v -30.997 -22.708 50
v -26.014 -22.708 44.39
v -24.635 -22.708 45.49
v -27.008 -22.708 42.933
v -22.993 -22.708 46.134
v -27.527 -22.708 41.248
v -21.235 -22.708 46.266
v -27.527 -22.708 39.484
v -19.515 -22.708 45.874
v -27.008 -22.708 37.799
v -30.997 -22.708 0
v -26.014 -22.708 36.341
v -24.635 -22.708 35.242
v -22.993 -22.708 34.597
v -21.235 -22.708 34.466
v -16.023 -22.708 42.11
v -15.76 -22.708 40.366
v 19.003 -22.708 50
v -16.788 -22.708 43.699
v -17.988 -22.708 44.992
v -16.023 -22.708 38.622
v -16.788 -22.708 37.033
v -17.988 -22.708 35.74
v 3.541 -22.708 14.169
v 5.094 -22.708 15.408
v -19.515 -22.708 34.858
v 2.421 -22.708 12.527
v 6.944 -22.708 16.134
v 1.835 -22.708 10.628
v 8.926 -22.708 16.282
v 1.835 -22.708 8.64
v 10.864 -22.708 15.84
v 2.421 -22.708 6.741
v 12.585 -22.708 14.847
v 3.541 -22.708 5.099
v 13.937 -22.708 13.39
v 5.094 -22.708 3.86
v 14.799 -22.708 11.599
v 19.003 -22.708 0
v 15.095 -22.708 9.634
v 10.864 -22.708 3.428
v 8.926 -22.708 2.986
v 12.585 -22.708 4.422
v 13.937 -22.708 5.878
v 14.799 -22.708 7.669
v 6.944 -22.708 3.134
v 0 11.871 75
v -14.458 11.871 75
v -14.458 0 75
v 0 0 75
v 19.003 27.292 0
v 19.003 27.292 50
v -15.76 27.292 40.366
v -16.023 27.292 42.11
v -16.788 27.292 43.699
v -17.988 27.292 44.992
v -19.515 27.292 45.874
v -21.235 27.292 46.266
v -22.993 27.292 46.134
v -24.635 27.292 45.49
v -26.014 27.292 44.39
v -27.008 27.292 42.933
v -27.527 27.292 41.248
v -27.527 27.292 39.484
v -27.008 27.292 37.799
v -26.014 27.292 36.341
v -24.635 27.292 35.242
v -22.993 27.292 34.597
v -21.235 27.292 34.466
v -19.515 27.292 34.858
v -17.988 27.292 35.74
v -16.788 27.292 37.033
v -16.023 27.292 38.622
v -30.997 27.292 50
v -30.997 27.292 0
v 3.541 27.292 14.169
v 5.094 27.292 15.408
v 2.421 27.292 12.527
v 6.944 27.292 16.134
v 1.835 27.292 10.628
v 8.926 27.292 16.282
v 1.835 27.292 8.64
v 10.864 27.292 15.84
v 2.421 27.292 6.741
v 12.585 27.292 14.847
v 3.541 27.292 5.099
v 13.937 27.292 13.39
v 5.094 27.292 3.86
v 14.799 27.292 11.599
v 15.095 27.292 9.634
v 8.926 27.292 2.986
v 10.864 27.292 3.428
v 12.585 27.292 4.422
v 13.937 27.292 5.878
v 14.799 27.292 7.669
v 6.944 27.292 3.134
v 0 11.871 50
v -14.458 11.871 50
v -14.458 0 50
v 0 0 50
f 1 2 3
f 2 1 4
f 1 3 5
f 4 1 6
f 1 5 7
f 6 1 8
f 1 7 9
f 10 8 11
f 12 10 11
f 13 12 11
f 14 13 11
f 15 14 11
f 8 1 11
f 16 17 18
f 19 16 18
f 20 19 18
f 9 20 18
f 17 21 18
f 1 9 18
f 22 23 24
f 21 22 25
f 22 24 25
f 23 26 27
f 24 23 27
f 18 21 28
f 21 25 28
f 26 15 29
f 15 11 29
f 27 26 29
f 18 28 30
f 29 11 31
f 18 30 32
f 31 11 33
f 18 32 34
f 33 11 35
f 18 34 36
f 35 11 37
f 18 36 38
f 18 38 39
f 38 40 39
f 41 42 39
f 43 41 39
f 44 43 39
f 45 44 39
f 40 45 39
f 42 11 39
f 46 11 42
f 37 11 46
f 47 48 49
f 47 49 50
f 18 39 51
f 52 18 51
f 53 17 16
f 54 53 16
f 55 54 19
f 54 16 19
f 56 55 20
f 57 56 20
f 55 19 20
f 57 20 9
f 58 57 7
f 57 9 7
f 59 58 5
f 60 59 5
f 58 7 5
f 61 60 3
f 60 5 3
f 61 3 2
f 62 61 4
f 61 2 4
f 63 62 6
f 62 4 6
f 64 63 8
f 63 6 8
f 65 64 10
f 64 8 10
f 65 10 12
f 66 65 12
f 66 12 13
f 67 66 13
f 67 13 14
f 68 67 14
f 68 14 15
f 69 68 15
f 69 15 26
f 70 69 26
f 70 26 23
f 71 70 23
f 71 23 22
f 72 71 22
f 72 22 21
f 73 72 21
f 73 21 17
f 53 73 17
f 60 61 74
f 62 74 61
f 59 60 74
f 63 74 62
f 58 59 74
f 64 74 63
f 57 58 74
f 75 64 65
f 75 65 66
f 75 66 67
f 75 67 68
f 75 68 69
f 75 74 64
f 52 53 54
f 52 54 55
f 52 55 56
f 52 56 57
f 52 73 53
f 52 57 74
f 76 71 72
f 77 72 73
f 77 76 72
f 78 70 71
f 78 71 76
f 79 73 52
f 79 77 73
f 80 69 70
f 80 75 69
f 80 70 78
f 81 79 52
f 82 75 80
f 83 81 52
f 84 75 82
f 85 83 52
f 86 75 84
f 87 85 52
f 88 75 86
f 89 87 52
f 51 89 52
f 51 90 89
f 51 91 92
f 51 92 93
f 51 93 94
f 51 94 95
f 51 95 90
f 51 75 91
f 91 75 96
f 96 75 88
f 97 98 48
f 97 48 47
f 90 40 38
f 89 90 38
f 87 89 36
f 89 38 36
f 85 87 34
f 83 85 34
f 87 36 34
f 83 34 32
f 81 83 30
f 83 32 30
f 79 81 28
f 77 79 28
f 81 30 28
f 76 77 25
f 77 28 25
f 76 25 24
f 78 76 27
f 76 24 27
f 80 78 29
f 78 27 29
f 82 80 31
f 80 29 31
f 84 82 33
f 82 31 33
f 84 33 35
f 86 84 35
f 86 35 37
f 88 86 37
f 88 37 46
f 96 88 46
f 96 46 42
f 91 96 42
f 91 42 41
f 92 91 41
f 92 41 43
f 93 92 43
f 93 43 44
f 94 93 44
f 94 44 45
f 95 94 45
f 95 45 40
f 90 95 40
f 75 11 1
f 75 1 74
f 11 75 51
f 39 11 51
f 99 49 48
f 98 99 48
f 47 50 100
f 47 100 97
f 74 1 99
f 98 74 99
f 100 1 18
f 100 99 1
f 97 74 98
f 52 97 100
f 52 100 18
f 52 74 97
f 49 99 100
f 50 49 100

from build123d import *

# Parameters (mm, degrees)
F0_W     = 50
F0_H     = 50
F1_DEPTH = 50
F2_R     = 5.916819
F2_R_2   = 6.667028
F3_DEPTH = 50.001
F4_W     = 14.457899
F4_H     = 11.871012
F5_DEPTH = 25


with BuildPart() as f1:
    # F0 (on Top) → F1 (new body)
    with BuildSketch(Plane.XY):
        with Locations((-5.997218, 2.292054)):
            Rectangle(F0_W, F0_H)
    extrude(amount=F1_DEPTH)

    # F2 (on face) → F3 (cut, through all)
    with BuildSketch(Plane.XZ.offset(22.707946)):
        with Locations((-21.676753, 40.365946)):
            Circle(F2_R)
        with Locations((8.427949, 9.634061)):
            Circle(F2_R_2)
    extrude(amount=-F3_DEPTH, mode=Mode.SUBTRACT)

    # F4 (on face) → F5 (join)
    with BuildSketch(Plane.XY.offset(50)):
        with Locations((-7.228949, 5.935506)):
            Rectangle(F4_W, F4_H)
    extrude(amount=F5_DEPTH)


solid = f1.part
